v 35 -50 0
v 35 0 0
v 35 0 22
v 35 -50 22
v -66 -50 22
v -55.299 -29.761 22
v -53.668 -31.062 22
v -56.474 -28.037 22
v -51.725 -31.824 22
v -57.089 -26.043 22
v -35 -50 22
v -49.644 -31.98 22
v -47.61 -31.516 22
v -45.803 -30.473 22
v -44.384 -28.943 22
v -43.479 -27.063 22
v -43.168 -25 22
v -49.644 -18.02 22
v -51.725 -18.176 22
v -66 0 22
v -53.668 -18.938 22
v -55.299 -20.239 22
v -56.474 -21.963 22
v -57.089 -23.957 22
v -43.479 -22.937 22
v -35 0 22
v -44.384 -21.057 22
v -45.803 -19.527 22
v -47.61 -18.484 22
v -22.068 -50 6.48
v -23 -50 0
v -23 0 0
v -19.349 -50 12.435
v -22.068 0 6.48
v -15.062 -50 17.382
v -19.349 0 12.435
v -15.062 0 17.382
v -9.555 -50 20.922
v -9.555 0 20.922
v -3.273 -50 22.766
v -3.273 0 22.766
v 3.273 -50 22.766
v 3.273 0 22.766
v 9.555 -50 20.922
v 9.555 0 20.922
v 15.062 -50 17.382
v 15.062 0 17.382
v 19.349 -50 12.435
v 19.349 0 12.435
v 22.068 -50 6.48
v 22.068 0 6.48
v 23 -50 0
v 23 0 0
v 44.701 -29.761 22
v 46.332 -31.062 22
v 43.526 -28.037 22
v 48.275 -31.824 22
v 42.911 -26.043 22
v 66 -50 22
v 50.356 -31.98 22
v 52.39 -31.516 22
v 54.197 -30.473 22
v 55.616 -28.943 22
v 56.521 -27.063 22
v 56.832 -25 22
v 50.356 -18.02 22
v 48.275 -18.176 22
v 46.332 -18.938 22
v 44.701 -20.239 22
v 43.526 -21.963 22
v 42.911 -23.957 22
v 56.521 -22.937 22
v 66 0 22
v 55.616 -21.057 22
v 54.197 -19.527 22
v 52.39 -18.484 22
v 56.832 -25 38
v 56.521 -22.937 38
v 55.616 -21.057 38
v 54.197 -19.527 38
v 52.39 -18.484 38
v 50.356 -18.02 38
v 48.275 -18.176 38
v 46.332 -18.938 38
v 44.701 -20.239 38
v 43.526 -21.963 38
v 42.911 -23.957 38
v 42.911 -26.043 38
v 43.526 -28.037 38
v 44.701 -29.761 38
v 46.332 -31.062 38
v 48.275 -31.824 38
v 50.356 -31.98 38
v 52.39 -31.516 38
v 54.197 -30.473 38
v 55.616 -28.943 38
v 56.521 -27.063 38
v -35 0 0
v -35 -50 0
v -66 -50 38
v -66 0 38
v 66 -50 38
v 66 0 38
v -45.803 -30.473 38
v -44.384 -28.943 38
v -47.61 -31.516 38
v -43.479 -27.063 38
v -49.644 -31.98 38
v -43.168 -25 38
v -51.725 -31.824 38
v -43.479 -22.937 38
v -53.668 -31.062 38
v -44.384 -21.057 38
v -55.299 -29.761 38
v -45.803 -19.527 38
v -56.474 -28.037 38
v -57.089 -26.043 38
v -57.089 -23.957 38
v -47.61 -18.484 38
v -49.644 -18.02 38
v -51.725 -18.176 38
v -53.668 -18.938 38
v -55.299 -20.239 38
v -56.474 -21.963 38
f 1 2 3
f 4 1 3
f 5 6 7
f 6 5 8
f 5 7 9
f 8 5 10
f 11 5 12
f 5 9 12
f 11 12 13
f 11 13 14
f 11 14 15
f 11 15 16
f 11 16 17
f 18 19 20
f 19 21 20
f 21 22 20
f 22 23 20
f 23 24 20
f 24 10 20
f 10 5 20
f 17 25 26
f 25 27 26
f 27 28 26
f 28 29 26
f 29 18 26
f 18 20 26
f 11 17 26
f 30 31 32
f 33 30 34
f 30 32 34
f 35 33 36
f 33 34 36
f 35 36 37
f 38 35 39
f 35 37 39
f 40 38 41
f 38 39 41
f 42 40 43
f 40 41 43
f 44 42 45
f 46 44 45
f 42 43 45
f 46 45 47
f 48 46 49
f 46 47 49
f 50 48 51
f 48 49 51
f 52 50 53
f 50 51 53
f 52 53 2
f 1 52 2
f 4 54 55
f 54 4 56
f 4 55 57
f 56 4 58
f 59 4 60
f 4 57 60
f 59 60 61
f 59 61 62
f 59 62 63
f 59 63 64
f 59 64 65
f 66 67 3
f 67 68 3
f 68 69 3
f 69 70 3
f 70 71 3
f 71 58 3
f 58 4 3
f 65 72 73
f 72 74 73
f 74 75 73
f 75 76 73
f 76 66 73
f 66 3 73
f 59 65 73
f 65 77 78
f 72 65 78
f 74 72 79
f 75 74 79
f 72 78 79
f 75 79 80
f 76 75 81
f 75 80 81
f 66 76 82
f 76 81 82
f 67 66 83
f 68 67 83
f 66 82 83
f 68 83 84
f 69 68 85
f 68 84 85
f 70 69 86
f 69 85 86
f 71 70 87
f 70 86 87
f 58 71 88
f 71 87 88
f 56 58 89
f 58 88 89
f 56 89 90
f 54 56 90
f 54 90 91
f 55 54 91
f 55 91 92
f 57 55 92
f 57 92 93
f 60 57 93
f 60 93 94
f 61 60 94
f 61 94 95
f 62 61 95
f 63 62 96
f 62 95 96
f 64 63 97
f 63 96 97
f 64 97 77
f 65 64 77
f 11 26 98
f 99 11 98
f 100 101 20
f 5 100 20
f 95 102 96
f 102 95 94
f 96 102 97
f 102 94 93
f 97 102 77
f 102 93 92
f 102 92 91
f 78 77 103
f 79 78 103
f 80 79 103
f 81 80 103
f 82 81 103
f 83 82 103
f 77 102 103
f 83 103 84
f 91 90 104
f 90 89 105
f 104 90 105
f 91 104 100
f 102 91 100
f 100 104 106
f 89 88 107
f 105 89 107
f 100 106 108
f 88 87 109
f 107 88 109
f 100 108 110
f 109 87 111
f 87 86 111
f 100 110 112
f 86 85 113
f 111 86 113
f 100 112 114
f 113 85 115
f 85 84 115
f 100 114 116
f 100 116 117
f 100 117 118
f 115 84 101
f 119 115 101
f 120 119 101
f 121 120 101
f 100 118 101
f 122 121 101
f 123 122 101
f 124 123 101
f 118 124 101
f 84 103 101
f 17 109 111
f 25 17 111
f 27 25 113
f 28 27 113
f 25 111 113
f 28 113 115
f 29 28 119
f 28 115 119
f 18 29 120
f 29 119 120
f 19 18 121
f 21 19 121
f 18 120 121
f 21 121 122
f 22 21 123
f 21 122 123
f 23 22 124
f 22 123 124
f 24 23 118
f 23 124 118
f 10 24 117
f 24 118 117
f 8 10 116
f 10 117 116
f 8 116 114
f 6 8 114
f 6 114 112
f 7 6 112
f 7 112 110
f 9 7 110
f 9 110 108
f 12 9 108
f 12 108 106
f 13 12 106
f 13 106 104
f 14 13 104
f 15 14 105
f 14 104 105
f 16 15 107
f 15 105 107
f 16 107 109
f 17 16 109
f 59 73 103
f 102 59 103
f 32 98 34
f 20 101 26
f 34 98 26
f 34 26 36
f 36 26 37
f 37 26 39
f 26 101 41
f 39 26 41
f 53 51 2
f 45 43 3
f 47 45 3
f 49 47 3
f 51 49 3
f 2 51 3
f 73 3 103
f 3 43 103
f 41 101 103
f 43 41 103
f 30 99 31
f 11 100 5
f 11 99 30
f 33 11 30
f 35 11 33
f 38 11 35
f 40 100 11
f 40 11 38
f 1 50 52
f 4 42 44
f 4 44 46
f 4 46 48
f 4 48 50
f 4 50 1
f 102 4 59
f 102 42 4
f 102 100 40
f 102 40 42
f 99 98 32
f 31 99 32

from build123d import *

# Parameters (mm, degrees)
F1_DEPTH = 50
F2_R     = 7
F3_DEPTH = 16


with BuildPart() as f1:
    # F0 (on Front) → F1 (new body)
    with BuildSketch(Plane.XZ):
        with BuildLine():
            Line((-35, 22), (-35, 0))
            Line((-35, 0), (-23, 0))
            ThreePointArc((-23, 0), (0, 23), (23, 0))
            Line((23, 0), (35, 0))
            Line((35, 0), (35, 22))
            Line((35, 22), (66, 22))
            Line((66, 22), (66, 38))
            Line((66, 38), (-66, 38))
            Line((-66, 38), (-66, 22))
            Line((-66, 22), (-35, 22))
        make_face()
    extrude(amount=F1_DEPTH)

    # F2 (on face) → F3 (cut)
    with BuildSketch(Plane.XY.offset(38)):
        with Locations((49.832433, -25)):
            Circle(F2_R)
        with Locations((-50.167567, -25)):
            Circle(F2_R)
    extrude(amount=-F3_DEPTH, mode=Mode.SUBTRACT)


solid = f1.part
